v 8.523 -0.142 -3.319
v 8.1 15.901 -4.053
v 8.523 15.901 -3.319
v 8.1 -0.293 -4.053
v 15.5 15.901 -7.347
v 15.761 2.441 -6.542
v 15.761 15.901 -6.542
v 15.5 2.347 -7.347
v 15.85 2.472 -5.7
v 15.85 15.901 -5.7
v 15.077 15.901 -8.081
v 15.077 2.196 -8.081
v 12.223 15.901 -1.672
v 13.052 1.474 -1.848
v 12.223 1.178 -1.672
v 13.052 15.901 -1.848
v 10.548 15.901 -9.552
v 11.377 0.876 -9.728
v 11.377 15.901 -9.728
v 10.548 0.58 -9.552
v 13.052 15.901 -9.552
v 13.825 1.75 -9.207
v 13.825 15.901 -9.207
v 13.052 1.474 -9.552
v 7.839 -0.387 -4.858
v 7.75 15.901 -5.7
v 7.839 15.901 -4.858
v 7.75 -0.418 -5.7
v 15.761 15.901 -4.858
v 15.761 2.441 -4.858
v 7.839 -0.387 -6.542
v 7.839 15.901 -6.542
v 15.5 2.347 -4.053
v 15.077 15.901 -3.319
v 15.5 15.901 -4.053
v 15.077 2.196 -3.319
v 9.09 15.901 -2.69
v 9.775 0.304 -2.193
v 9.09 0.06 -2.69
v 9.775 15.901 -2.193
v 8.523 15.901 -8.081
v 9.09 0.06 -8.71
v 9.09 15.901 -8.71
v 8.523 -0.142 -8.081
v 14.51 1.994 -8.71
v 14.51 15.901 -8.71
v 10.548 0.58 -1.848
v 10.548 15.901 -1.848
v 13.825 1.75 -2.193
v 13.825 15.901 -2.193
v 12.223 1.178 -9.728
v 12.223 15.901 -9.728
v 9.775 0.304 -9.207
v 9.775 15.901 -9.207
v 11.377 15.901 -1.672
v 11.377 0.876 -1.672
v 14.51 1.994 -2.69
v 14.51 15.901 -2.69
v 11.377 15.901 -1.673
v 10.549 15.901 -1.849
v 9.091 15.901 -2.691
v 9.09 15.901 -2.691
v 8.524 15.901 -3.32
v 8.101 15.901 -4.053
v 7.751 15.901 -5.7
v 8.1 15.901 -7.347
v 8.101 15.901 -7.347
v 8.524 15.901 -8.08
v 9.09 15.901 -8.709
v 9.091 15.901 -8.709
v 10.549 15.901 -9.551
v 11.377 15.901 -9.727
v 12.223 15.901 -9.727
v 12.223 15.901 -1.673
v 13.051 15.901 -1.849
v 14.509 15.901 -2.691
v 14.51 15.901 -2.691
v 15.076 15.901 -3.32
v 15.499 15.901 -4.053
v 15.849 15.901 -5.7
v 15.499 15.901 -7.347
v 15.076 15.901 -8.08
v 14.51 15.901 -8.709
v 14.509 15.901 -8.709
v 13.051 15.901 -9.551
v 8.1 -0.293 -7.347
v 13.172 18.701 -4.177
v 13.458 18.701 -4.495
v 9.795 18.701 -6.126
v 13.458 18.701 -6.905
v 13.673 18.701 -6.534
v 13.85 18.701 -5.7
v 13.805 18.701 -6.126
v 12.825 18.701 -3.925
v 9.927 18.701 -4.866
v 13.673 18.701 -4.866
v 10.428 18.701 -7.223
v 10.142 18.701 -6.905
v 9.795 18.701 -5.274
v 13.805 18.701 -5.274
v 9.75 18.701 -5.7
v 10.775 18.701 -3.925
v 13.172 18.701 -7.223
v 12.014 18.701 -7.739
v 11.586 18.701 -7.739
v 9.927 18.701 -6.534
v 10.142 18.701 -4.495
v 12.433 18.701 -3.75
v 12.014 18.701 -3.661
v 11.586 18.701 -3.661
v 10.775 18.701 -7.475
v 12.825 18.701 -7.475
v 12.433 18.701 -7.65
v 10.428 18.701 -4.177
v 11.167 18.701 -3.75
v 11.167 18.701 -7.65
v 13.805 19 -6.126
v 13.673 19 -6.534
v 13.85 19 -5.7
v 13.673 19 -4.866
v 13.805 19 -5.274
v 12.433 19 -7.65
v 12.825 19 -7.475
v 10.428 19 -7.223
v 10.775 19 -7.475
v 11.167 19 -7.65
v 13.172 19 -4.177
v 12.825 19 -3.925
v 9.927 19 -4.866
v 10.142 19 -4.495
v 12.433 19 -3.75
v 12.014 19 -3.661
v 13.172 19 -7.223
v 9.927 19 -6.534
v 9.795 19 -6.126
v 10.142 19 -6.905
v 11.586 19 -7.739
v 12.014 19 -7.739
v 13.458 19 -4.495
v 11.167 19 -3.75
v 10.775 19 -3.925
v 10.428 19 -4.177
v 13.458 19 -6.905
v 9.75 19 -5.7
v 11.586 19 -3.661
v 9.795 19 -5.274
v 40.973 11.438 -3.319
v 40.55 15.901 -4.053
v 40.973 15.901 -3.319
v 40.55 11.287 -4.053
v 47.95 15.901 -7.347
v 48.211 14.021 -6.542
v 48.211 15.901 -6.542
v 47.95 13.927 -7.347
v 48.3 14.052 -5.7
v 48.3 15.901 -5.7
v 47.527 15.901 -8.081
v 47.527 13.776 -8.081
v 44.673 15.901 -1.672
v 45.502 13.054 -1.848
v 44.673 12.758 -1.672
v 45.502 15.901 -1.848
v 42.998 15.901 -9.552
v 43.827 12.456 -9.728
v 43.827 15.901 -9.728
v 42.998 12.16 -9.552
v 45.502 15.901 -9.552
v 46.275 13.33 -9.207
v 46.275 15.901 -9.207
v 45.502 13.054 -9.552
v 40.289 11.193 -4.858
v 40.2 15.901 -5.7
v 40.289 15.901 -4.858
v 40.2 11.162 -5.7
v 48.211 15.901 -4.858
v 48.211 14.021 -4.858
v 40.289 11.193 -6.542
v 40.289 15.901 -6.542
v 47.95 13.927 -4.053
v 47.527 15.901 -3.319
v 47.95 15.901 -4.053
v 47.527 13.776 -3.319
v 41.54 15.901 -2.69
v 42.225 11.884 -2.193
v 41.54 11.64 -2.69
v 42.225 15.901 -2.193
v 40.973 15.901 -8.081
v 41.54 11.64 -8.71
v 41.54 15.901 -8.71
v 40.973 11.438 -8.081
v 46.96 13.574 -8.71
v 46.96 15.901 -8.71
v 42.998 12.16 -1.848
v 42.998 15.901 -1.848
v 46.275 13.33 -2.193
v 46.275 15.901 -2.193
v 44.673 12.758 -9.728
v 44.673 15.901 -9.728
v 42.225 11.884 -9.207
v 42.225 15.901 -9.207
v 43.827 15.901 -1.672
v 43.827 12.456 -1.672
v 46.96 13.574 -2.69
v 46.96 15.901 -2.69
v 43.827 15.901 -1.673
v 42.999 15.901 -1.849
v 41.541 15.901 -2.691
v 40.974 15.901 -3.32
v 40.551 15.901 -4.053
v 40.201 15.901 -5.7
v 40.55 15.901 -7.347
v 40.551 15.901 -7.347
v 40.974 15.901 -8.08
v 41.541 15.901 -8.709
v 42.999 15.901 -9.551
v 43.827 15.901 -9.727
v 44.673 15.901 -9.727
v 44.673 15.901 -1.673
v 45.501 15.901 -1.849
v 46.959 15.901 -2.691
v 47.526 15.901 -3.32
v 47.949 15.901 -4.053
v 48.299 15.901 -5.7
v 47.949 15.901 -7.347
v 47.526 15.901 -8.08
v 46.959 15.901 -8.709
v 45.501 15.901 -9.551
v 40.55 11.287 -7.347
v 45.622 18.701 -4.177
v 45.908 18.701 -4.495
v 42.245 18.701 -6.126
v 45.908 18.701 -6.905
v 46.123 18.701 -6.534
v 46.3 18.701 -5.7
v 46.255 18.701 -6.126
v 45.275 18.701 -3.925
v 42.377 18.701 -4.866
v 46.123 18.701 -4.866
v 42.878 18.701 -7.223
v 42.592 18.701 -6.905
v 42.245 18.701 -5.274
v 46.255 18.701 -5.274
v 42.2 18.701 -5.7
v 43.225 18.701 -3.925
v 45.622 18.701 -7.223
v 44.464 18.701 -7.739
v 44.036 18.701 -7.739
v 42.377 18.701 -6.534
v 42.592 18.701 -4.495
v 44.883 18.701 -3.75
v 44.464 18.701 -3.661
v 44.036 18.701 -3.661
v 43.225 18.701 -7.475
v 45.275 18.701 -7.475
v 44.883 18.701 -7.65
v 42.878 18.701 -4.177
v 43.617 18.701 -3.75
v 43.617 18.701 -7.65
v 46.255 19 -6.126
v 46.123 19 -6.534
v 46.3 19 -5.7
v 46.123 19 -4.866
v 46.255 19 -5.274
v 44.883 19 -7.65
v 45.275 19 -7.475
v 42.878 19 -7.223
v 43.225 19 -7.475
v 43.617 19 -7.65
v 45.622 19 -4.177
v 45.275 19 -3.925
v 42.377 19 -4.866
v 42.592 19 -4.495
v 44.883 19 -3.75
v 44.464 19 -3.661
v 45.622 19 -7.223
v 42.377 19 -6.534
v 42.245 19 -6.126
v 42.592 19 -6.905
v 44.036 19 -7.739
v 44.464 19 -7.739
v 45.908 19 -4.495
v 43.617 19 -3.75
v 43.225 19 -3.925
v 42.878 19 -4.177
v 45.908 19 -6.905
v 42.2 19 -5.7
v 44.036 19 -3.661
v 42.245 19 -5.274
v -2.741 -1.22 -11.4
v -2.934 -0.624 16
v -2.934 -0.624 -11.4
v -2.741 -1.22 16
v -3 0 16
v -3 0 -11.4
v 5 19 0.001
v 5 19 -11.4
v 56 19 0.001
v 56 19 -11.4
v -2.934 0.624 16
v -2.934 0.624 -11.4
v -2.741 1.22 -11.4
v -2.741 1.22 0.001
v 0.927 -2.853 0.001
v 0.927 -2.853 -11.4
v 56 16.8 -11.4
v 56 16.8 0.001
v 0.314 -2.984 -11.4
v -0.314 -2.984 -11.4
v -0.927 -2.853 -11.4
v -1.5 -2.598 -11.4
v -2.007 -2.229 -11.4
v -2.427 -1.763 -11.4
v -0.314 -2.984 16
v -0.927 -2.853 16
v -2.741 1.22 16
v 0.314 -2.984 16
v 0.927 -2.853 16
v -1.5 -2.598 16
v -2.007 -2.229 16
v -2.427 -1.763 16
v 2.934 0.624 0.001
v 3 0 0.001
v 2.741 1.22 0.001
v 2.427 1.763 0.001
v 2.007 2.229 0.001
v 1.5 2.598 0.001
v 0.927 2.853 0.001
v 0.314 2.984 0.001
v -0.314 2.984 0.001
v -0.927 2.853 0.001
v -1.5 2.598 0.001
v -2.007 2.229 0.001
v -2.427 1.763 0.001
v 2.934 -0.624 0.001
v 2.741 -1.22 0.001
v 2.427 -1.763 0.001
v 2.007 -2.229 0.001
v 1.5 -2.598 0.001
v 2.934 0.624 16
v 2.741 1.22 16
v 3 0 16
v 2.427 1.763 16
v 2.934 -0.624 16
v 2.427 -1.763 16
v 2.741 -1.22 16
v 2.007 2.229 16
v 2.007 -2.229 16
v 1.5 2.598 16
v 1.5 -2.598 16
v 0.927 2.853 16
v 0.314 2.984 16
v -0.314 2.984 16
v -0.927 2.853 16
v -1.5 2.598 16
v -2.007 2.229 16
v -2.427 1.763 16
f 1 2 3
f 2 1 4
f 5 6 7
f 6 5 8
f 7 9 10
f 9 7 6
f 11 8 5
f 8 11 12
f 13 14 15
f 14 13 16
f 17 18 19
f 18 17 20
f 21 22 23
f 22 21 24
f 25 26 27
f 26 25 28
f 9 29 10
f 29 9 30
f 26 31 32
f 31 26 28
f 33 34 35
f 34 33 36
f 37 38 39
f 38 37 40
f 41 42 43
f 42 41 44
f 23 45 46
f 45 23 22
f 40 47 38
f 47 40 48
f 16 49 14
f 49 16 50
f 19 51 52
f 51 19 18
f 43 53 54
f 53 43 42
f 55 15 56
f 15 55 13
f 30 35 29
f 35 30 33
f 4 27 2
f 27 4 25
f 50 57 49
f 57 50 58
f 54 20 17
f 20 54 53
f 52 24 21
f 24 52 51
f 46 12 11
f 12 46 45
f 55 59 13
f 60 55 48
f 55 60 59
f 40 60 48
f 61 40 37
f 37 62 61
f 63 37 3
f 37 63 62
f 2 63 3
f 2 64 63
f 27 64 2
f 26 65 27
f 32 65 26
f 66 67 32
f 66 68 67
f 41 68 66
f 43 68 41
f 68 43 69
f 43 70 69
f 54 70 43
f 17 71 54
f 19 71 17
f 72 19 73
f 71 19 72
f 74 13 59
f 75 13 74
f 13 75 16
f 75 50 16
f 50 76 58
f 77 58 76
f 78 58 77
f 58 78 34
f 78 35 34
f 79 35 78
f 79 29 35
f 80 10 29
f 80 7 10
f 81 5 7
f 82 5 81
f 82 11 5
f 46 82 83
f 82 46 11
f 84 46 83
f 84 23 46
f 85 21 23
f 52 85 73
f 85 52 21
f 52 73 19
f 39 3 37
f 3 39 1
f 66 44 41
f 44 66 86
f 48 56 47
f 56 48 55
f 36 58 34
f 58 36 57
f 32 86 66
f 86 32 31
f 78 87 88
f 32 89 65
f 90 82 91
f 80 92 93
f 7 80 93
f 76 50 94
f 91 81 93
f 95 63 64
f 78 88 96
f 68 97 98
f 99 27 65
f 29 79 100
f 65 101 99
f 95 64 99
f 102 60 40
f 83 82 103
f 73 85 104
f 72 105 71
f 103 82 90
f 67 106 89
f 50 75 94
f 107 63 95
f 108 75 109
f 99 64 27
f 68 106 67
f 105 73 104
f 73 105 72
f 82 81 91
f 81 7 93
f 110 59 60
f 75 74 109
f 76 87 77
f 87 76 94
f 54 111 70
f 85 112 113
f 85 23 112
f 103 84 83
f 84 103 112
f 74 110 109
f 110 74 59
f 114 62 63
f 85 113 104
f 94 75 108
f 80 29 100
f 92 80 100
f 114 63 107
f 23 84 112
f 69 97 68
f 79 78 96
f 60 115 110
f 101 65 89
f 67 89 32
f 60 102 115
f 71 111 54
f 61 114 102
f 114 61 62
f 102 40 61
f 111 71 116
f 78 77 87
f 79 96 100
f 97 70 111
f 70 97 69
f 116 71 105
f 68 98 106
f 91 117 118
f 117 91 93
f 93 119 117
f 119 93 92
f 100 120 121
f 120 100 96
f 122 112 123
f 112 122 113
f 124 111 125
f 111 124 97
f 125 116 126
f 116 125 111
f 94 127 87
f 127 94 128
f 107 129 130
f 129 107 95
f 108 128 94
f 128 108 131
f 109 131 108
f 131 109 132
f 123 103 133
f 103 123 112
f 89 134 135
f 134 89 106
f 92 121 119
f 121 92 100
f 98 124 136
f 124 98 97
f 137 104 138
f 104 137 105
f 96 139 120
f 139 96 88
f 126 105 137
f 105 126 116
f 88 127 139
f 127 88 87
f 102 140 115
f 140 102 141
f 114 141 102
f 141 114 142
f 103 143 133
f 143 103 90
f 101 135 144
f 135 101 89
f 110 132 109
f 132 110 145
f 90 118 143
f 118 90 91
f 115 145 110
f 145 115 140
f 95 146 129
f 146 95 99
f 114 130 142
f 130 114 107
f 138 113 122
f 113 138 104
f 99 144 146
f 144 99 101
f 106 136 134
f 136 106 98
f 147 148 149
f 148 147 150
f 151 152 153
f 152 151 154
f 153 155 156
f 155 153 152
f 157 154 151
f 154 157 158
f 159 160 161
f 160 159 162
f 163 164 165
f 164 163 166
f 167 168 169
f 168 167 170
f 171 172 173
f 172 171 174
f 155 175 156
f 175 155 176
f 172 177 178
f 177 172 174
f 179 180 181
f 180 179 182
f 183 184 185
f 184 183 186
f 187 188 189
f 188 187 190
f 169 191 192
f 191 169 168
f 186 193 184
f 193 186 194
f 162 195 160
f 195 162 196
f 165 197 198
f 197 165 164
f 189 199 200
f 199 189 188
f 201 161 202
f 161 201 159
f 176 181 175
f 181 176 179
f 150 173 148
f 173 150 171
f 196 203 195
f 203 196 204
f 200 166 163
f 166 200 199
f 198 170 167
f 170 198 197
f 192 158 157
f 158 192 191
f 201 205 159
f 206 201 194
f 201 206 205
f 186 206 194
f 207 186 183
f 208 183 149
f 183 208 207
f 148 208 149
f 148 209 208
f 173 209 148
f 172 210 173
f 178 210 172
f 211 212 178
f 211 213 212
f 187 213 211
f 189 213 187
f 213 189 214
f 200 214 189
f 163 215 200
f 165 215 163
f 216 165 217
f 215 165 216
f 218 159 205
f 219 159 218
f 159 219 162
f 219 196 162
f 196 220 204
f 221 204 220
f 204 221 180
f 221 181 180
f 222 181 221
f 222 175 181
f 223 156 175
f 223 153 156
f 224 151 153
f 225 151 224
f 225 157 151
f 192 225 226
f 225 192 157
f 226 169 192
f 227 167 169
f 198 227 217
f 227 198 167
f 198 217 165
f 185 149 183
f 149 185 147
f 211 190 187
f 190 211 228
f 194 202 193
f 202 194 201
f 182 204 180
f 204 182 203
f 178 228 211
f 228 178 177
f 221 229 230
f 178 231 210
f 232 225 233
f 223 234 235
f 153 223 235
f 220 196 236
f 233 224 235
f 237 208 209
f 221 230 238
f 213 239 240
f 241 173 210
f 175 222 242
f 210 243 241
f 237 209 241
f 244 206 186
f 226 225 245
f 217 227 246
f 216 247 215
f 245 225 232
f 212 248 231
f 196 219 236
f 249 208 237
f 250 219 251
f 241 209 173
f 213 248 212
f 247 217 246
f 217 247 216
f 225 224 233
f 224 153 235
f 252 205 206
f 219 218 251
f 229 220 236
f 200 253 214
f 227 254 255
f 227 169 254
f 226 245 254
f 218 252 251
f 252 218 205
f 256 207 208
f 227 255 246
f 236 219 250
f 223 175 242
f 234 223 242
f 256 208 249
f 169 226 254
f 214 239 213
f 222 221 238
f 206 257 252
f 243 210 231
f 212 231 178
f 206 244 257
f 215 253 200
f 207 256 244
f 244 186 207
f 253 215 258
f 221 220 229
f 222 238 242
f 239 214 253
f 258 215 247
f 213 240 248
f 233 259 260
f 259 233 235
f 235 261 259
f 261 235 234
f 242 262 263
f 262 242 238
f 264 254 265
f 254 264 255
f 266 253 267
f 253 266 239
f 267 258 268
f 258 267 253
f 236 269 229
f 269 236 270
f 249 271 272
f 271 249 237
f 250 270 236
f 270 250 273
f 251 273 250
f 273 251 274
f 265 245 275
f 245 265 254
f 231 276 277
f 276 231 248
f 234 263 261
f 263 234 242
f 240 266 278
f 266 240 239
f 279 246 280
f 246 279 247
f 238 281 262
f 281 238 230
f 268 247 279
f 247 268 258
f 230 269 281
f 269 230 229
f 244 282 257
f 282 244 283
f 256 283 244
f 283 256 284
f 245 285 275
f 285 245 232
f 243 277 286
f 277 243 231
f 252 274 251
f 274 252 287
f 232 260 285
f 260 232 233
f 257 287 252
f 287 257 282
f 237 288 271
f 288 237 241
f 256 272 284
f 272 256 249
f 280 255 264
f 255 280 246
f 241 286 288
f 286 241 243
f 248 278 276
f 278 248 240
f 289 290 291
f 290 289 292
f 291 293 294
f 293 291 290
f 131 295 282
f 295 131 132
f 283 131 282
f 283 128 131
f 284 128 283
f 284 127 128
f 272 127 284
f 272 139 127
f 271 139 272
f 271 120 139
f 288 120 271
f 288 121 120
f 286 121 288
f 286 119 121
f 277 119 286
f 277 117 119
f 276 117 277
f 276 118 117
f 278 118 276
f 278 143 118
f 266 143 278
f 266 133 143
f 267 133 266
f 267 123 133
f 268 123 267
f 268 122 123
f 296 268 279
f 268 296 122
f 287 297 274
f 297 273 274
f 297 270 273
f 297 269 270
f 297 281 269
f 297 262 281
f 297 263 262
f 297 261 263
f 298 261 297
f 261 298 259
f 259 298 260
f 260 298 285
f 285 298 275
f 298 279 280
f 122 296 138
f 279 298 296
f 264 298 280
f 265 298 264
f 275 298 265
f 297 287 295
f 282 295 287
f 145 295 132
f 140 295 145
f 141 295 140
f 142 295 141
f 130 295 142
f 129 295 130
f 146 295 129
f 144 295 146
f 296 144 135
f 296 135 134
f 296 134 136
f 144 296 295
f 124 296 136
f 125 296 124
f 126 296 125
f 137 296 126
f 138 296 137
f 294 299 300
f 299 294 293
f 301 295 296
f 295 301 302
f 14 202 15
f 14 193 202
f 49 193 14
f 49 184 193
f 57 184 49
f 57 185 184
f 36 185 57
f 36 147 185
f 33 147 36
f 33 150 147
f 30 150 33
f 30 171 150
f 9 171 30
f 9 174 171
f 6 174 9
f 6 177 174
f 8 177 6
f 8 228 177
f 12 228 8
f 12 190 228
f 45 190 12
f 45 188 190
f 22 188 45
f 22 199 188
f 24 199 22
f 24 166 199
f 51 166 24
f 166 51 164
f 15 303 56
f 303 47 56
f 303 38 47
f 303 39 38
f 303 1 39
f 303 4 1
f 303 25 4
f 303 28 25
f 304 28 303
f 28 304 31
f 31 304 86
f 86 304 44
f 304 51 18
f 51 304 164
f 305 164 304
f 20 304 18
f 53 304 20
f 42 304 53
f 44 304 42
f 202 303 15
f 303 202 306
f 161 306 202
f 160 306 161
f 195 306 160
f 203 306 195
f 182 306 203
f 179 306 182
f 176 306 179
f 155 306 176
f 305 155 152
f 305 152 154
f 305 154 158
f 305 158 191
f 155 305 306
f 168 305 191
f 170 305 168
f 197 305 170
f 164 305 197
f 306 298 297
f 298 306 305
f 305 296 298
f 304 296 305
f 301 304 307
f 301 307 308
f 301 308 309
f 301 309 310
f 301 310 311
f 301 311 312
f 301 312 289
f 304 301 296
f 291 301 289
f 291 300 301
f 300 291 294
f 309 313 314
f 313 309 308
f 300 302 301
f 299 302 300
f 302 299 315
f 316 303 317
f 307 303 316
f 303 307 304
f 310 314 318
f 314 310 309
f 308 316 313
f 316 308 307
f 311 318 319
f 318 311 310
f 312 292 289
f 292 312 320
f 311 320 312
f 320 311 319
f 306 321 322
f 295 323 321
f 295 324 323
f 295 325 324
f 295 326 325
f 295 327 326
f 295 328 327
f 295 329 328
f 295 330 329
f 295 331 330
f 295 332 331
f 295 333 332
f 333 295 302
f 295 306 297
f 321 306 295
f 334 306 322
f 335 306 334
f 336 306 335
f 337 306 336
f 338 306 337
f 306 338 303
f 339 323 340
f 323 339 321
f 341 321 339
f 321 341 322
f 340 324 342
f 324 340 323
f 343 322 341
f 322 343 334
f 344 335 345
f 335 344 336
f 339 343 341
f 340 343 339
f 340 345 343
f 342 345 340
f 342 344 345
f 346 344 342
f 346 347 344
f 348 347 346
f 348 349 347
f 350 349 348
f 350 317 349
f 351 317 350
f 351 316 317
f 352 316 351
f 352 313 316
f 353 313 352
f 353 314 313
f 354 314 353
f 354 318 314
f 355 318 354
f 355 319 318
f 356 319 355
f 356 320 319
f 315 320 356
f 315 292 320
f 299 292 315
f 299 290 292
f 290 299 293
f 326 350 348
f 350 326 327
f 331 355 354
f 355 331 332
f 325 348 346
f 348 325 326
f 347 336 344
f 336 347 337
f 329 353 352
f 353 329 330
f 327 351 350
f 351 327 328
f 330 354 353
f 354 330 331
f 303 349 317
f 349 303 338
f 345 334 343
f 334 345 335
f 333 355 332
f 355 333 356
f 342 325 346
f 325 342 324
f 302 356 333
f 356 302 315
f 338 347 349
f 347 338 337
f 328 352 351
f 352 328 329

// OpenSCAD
eps = 0.001;
$fn = 30;

// Cavity for a #8 x 1/2" screw.
module screw() {
  h1 = 0.4;
  d1 = 8.1;
  
  h2 = 2.8;
  d2 = 4.1;
  
  translate([0, 0, -20])
  cylinder(h=20+h1+eps, d=d1);
  
  translate([0, 0, h1])
  cylinder(h=h2+eps, d1=d1, d2=d2);
  
  cylinder(h=20, d=d2);
}

pin_d = 6;
pin_h = 16;

bracket_l = 59;
bracket_h = 19;
bracket_w = 11.4;

module hinge() {
  cylinder(h=pin_h, d=pin_d);
  
  difference() {
    translate([0, 0, -bracket_w])
    linear_extrude(bracket_w+eps)
    hull() {
      circle(d=pin_d);
      
      tip = 2.2;
      tuck = 8;
      translate([tuck-pin_d/2, bracket_h-tip])
      square([bracket_l-tuck, tip]);
    }
  
    for (x = bracket_l * [0.2, 0.75])
    translate([x, bracket_h-3.5, -bracket_w/2])
    rotate([-90, 0, 0])
    screw();
  }
}

hinge();
